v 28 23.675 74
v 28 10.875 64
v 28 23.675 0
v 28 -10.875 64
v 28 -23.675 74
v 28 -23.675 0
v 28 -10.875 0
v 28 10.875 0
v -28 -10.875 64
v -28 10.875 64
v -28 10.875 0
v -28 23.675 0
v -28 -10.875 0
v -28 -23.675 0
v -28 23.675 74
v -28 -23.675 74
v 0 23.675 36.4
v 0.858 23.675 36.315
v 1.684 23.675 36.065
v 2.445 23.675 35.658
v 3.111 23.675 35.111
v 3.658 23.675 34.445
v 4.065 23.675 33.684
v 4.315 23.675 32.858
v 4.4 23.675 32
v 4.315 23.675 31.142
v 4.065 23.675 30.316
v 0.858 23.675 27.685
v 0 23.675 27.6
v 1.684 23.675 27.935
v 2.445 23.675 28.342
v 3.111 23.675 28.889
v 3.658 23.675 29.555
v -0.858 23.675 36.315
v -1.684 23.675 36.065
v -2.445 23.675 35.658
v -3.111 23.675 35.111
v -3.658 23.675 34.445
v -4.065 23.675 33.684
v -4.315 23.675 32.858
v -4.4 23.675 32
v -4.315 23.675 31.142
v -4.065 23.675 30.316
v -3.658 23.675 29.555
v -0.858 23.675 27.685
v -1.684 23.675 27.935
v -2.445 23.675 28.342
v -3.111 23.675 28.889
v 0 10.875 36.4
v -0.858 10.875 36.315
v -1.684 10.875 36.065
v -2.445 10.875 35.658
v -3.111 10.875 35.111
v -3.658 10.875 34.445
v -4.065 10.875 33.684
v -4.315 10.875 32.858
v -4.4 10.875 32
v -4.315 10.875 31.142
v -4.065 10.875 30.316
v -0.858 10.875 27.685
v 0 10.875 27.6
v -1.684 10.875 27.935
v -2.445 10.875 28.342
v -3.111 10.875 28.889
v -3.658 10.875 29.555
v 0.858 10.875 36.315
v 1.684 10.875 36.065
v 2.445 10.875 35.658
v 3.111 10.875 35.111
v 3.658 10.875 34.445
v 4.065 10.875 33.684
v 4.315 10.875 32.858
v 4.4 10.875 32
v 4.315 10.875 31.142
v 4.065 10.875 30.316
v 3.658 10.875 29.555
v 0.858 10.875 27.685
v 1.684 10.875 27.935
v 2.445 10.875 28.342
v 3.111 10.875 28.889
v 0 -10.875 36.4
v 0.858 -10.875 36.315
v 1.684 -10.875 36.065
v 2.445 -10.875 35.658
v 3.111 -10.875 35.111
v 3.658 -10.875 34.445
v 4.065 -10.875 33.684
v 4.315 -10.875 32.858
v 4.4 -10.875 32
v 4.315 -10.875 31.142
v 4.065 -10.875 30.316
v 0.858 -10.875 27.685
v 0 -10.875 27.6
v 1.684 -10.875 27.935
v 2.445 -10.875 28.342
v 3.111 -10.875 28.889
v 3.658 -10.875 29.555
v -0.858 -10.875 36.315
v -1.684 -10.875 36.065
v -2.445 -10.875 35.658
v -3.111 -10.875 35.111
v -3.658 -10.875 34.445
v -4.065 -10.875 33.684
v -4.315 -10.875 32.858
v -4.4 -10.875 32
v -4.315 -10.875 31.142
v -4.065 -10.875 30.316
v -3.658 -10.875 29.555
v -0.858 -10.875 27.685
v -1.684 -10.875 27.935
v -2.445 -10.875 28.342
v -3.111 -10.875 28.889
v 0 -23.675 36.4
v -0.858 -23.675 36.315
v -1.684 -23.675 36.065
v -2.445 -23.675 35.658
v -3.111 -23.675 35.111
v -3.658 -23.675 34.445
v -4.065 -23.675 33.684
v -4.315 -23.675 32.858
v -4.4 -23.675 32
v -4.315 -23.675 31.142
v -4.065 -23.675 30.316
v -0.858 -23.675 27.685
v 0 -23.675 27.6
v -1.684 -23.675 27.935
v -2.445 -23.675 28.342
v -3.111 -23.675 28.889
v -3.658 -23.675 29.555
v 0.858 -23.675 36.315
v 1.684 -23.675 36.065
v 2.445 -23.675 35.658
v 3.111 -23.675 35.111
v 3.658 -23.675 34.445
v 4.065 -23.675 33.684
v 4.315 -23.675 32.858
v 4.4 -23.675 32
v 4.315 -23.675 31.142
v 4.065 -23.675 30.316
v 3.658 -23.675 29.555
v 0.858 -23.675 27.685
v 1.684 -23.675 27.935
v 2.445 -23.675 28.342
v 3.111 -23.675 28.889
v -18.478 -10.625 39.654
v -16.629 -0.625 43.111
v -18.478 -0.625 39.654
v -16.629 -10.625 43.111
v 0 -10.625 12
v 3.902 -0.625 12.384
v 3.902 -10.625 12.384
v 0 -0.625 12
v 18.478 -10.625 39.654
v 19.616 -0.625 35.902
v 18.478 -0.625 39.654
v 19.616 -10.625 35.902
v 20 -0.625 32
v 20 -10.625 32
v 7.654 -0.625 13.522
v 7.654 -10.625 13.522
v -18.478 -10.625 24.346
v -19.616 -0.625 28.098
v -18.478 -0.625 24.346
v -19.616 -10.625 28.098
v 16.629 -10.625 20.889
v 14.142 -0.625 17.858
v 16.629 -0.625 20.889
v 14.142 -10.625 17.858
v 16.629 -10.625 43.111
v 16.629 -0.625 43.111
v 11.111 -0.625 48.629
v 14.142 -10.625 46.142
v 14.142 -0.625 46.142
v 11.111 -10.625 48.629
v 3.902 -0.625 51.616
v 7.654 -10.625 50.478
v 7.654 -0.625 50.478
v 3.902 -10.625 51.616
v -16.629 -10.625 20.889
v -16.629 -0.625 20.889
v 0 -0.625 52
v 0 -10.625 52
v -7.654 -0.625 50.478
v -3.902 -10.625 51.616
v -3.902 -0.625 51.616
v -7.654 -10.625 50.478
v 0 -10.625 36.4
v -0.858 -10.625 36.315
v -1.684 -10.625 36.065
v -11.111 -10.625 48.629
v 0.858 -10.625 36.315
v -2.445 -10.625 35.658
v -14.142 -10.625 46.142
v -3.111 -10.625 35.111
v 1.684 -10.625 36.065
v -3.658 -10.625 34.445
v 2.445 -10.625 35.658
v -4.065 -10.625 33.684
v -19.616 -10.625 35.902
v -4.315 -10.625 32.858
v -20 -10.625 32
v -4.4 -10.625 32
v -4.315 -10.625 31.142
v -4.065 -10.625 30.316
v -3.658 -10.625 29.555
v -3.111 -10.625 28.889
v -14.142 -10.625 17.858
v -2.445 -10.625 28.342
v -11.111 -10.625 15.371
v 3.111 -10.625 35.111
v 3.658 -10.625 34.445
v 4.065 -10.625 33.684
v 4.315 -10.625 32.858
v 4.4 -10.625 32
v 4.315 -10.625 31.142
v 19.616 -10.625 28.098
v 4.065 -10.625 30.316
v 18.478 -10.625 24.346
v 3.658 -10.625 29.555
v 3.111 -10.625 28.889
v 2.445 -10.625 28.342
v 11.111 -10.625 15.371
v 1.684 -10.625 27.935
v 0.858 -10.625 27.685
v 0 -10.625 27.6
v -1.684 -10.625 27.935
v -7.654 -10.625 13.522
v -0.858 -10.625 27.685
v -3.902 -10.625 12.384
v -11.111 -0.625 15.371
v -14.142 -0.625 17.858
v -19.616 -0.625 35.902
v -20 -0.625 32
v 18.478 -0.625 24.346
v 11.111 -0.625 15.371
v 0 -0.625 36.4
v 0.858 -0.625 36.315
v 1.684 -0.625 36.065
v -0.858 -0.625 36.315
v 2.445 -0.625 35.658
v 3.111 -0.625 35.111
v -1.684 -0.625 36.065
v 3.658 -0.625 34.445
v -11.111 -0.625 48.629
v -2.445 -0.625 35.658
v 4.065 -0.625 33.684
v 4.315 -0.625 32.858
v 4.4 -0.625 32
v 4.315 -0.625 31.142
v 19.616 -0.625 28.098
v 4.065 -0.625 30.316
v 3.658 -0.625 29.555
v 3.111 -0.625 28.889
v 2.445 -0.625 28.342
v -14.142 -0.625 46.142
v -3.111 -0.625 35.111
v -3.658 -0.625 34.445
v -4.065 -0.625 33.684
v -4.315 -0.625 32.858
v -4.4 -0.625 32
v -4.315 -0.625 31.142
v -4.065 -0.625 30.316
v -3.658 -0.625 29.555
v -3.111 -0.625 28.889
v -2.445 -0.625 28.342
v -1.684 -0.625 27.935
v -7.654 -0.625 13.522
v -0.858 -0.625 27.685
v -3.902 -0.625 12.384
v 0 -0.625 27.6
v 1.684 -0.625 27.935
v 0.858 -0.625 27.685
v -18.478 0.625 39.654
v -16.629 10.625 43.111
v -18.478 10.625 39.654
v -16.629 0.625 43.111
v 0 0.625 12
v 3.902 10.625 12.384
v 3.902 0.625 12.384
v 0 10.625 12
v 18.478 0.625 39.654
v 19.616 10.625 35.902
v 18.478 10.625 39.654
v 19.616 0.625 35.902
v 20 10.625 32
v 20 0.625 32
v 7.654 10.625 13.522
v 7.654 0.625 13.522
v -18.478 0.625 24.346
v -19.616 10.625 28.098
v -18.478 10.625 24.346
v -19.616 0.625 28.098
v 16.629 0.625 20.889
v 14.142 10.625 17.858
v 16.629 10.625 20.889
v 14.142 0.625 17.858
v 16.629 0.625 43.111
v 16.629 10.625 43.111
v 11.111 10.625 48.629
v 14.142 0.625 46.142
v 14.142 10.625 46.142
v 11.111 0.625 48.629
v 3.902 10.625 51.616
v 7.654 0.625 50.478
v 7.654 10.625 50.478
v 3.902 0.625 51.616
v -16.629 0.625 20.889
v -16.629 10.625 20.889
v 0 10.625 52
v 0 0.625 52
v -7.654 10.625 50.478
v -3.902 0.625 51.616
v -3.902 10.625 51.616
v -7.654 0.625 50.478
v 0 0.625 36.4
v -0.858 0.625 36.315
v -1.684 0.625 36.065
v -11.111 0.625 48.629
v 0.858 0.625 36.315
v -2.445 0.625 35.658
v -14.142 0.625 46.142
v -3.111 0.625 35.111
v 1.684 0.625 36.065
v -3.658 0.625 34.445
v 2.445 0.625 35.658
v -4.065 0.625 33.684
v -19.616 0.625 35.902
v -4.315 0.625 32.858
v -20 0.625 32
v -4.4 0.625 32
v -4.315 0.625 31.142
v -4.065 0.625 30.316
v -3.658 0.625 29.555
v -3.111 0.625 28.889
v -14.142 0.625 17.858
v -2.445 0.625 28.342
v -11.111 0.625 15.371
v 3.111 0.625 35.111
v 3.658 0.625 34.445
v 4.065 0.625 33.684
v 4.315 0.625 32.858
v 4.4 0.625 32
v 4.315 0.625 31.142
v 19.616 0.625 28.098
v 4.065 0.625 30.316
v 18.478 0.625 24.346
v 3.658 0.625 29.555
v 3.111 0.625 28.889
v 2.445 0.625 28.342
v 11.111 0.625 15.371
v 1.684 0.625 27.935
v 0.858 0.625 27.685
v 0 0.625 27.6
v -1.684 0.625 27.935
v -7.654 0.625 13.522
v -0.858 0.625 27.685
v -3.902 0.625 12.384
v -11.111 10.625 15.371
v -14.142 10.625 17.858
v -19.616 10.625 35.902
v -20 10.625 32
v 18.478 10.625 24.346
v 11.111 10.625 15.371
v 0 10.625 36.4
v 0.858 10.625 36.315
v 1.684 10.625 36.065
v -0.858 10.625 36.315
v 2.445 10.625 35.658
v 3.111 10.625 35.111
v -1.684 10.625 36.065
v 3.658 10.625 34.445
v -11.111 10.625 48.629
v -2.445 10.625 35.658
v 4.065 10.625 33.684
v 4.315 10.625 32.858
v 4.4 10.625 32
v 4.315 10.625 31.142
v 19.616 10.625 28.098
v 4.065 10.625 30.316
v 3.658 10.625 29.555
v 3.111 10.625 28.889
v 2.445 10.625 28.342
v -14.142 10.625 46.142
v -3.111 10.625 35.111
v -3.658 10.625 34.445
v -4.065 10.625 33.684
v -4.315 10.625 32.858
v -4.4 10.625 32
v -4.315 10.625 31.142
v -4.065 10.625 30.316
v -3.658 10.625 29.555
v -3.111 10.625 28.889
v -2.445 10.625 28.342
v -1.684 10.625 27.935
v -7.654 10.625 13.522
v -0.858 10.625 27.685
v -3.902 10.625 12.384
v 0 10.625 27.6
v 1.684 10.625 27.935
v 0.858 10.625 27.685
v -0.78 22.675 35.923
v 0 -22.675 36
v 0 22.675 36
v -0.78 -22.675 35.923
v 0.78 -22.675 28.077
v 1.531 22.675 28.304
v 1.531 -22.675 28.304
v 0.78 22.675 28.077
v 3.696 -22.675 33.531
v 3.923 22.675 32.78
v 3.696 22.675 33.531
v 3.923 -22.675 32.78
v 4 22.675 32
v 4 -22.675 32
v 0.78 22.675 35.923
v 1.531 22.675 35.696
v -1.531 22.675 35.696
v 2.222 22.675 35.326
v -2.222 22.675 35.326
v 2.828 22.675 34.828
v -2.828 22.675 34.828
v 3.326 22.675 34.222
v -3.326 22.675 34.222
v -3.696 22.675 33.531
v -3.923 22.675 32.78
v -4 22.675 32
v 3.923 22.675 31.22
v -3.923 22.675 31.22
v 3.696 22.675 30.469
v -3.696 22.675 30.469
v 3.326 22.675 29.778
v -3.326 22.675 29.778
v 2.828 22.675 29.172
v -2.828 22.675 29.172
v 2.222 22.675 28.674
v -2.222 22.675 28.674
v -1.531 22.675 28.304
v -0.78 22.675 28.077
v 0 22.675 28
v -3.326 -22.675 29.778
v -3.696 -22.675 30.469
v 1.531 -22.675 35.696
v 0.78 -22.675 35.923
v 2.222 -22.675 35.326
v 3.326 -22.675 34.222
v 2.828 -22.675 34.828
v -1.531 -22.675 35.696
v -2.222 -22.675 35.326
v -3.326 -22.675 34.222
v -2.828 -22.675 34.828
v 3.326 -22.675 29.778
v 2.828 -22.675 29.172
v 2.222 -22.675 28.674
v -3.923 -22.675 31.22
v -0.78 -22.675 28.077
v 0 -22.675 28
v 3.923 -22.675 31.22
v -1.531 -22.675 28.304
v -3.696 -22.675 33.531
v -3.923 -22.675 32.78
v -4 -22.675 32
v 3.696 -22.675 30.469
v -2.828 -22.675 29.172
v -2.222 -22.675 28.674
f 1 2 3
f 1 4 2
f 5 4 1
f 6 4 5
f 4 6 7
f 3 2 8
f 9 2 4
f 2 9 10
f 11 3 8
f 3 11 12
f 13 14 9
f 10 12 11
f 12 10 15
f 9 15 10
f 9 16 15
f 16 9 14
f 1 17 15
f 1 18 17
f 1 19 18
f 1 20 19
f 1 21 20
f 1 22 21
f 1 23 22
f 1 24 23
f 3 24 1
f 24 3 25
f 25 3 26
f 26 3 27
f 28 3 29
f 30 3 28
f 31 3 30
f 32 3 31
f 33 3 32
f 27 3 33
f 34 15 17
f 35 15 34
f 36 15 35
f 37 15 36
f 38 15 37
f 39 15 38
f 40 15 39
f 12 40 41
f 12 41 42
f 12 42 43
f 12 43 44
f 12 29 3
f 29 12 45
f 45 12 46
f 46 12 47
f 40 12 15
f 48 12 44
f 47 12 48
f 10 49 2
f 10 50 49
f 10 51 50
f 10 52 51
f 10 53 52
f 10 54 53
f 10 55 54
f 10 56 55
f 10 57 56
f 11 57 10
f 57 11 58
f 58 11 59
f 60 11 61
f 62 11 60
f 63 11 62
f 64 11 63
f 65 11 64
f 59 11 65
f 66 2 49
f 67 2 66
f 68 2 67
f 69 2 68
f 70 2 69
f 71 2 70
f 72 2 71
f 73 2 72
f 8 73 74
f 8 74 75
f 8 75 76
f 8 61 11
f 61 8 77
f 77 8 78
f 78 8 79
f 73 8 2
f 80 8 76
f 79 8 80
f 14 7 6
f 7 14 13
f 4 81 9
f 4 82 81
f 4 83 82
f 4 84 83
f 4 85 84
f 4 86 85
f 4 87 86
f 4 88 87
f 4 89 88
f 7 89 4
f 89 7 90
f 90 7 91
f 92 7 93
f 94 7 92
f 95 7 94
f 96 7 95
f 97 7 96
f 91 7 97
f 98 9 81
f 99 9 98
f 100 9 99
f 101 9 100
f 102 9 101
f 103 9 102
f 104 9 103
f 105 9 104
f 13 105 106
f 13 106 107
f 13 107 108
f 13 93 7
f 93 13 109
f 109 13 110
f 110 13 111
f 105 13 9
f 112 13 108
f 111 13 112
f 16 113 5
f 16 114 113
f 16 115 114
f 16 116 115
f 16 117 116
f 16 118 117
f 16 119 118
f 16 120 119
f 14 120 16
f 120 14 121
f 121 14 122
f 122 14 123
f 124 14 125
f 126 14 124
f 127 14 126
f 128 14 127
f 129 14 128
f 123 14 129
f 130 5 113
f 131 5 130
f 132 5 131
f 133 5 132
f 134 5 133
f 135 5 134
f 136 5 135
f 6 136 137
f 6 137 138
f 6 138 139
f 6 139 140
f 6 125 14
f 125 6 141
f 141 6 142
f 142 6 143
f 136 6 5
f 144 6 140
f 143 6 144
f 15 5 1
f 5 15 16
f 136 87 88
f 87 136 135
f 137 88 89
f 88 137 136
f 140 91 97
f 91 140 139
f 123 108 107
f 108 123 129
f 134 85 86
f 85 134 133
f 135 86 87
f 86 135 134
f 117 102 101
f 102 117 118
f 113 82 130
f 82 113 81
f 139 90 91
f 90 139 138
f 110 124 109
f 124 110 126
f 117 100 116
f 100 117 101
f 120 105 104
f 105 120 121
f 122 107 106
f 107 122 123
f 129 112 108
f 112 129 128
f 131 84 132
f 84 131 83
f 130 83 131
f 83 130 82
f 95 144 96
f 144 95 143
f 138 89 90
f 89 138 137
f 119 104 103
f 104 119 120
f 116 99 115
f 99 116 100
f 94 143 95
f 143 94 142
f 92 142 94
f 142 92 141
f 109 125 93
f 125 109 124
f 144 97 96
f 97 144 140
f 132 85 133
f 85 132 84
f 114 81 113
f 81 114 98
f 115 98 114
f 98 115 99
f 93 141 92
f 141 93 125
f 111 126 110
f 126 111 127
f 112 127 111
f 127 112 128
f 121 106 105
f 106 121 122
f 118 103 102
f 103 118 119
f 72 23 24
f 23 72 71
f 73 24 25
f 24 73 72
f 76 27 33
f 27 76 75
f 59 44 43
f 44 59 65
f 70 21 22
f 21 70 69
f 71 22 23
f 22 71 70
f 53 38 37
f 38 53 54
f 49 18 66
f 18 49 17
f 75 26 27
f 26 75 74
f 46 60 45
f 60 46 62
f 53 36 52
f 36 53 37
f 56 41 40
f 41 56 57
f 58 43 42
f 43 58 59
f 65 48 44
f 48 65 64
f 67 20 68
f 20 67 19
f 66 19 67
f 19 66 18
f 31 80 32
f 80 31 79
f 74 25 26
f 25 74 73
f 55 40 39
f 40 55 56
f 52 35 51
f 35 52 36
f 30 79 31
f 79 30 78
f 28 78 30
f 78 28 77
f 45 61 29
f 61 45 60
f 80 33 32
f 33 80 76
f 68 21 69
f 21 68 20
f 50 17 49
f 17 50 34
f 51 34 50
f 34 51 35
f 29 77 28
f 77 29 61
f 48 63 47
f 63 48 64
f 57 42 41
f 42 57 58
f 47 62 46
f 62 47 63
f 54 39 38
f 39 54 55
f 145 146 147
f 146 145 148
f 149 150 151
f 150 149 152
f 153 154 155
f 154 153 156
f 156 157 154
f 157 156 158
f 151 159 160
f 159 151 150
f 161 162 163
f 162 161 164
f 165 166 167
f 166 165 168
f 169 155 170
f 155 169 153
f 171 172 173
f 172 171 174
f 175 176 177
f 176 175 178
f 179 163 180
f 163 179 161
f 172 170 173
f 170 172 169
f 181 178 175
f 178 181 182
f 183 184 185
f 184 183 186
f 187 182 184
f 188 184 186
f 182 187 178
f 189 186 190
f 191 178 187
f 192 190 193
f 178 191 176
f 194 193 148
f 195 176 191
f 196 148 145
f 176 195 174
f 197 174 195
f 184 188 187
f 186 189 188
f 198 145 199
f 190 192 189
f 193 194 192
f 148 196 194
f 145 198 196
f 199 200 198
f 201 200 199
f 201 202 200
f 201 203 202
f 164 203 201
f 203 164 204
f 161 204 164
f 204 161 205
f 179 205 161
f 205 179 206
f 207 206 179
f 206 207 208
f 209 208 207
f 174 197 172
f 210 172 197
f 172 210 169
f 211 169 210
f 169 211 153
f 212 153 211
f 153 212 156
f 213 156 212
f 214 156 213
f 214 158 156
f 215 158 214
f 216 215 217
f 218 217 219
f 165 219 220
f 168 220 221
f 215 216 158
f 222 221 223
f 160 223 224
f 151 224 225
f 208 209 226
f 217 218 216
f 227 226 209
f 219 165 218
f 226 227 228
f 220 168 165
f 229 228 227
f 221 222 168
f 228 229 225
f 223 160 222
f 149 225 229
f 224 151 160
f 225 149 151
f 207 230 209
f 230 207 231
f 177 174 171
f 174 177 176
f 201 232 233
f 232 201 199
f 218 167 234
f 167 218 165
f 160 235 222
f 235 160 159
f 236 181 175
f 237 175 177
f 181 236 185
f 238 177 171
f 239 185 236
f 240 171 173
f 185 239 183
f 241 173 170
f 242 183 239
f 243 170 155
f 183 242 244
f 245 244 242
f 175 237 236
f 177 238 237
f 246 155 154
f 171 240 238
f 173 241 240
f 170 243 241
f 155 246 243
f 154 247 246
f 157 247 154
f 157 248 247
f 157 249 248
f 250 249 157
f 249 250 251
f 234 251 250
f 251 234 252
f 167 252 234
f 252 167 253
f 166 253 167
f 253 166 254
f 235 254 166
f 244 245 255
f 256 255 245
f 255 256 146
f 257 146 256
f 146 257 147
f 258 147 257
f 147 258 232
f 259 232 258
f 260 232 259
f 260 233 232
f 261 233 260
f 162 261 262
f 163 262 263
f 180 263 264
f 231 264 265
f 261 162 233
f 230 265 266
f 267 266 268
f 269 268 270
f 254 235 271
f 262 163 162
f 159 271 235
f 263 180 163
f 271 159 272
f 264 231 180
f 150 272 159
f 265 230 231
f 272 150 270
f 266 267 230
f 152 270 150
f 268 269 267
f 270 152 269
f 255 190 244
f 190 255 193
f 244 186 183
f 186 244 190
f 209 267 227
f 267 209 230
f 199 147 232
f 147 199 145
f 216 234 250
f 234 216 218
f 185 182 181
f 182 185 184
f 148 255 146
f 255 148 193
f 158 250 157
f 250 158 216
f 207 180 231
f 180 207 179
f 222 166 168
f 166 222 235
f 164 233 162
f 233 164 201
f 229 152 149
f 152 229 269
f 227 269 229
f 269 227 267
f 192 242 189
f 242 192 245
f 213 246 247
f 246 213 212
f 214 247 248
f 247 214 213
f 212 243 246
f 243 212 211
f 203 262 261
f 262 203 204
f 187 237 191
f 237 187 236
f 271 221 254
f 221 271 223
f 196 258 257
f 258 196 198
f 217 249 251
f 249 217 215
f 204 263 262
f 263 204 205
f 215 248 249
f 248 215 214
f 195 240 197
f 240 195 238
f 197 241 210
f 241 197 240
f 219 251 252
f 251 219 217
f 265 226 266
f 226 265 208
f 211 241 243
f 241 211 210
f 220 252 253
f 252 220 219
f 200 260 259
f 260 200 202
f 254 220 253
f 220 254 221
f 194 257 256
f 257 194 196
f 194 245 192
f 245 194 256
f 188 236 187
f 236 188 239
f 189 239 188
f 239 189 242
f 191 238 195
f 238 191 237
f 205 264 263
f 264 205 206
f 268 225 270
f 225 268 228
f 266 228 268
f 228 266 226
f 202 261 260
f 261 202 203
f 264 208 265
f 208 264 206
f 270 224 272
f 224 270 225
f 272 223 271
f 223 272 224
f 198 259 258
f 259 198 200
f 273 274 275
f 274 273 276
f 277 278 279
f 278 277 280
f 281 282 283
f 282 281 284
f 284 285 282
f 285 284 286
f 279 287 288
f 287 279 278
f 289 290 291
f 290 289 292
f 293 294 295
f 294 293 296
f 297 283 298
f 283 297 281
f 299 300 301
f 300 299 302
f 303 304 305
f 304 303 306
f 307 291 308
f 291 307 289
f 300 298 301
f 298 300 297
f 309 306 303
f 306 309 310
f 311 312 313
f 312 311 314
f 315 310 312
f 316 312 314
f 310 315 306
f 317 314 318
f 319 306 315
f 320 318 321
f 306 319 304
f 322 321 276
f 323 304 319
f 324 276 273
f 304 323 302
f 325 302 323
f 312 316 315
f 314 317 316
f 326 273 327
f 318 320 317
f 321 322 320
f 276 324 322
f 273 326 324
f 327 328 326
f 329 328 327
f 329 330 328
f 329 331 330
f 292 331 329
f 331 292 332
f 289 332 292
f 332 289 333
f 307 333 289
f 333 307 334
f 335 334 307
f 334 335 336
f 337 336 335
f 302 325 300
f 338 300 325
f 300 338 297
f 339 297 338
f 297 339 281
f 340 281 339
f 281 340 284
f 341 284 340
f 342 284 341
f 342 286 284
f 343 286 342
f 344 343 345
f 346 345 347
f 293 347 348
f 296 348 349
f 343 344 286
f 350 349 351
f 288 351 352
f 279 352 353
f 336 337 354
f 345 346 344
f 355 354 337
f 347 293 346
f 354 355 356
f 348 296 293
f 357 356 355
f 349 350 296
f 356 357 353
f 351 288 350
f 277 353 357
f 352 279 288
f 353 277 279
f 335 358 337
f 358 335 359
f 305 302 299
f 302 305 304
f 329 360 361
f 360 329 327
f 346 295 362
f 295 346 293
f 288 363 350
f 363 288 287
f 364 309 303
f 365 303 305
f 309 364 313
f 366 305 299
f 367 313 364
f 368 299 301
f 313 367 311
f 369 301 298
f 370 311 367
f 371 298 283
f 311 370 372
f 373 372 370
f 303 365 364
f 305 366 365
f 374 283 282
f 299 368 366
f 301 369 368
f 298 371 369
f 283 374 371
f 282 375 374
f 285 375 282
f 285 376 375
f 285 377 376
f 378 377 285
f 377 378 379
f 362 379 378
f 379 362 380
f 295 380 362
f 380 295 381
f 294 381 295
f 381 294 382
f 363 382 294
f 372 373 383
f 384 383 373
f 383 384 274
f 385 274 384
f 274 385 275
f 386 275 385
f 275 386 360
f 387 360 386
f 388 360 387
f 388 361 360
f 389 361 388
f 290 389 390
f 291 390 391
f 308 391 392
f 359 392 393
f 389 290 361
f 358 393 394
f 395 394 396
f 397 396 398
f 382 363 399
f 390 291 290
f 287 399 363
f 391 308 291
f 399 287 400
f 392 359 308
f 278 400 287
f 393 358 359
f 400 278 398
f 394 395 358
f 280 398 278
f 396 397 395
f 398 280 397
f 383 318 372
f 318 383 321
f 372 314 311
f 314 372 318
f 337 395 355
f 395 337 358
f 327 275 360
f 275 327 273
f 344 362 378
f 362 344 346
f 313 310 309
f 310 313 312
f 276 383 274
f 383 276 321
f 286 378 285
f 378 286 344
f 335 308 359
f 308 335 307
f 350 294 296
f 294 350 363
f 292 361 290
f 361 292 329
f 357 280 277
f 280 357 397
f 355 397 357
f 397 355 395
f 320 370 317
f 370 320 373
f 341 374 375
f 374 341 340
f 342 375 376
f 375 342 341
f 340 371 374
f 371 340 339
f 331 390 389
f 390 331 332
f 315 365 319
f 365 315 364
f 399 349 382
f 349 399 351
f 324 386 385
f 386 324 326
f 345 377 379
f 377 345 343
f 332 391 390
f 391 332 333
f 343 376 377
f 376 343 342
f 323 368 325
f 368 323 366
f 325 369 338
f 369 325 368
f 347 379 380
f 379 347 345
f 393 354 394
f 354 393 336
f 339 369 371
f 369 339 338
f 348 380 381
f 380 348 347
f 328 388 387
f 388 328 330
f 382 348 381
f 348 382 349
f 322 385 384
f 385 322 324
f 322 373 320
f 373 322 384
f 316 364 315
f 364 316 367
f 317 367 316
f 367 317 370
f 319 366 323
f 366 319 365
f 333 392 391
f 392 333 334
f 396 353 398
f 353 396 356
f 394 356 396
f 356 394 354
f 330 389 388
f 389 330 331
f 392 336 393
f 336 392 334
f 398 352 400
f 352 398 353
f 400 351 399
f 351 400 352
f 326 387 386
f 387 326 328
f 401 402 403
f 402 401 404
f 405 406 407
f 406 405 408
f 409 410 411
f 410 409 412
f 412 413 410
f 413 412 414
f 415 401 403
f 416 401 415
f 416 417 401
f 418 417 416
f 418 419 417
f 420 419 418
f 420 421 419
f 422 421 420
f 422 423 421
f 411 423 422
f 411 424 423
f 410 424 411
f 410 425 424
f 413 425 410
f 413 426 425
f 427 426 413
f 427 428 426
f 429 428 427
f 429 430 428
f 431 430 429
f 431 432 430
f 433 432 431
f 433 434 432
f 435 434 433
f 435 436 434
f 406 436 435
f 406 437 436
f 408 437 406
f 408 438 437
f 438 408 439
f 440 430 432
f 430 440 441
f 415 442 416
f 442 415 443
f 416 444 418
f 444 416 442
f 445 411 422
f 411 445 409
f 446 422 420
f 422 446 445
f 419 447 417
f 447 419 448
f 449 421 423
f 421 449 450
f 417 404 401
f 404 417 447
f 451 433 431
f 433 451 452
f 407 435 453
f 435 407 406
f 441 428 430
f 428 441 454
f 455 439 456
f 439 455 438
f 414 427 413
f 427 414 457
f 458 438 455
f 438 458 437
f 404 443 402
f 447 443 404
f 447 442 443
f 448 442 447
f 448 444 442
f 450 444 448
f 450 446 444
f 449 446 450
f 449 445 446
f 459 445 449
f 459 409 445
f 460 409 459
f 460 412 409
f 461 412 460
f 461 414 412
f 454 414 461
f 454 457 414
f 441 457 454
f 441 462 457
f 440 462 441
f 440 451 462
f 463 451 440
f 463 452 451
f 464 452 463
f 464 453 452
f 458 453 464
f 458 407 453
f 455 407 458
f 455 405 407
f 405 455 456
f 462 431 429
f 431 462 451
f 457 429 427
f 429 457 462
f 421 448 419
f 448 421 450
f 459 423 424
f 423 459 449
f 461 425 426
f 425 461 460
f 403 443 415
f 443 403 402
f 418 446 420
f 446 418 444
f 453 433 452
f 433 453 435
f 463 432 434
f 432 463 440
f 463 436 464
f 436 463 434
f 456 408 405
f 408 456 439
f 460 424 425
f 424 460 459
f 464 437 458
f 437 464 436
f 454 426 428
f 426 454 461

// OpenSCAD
$fn = 32;

// ------------------------------------------------------------------------
// Trolley wheel set: wheels d40, fork 64 mm tall
// Every part is its own module, assembly() places every instance.
// ------------------------------------------------------------------------

// --- part 1 ---
module trolley_fork() {
  difference() {
    union() {
      translate([-28, 10.875, 0]) cube([56, 12.8, 64]);
      translate([-28, -23.675, 0]) cube([56, 12.8, 64]);
      translate([-28, -23.675, 64]) cube([56, 47.35, 10]);
    }
    translate([0, -17.275, 32]) rotate([90, 0, 0]) cylinder(h = 14.8, d = 8.8, center = true);
    translate([0, 17.275, 32]) rotate([90, 0, 0]) cylinder(h = 14.8, d = 8.8, center = true);
  }
}

// --- part 2 ---
module trolley_wheel() {
  difference() {
      translate([0, 0, 0]) cylinder(h = 10, d = 40);
      translate([0, 0, -1]) cylinder(h = 12, d = 8.8);
    }
}

// --- part 3 ---
module trolley_axle() {
  translate([0, 0, -22.675]) cylinder(h = 45.35, d = 8);
}

// --- assembly ---
module assembly() {
  color([0.80, 0.24, 0.20]) translate([0, 0, 0]) rotate([0, 0, 0]) trolley_fork();
  color([0.20, 0.45, 0.75]) translate([0, -0.625, 32]) rotate([90, 0, 0]) trolley_wheel();
  color([0.25, 0.62, 0.32]) translate([0, 10.625, 32]) rotate([90, 0, 0]) trolley_wheel();
  color([0.92, 0.70, 0.18]) translate([0, 0, 32]) rotate([90, 0, 0]) trolley_axle();
}

assembly();
